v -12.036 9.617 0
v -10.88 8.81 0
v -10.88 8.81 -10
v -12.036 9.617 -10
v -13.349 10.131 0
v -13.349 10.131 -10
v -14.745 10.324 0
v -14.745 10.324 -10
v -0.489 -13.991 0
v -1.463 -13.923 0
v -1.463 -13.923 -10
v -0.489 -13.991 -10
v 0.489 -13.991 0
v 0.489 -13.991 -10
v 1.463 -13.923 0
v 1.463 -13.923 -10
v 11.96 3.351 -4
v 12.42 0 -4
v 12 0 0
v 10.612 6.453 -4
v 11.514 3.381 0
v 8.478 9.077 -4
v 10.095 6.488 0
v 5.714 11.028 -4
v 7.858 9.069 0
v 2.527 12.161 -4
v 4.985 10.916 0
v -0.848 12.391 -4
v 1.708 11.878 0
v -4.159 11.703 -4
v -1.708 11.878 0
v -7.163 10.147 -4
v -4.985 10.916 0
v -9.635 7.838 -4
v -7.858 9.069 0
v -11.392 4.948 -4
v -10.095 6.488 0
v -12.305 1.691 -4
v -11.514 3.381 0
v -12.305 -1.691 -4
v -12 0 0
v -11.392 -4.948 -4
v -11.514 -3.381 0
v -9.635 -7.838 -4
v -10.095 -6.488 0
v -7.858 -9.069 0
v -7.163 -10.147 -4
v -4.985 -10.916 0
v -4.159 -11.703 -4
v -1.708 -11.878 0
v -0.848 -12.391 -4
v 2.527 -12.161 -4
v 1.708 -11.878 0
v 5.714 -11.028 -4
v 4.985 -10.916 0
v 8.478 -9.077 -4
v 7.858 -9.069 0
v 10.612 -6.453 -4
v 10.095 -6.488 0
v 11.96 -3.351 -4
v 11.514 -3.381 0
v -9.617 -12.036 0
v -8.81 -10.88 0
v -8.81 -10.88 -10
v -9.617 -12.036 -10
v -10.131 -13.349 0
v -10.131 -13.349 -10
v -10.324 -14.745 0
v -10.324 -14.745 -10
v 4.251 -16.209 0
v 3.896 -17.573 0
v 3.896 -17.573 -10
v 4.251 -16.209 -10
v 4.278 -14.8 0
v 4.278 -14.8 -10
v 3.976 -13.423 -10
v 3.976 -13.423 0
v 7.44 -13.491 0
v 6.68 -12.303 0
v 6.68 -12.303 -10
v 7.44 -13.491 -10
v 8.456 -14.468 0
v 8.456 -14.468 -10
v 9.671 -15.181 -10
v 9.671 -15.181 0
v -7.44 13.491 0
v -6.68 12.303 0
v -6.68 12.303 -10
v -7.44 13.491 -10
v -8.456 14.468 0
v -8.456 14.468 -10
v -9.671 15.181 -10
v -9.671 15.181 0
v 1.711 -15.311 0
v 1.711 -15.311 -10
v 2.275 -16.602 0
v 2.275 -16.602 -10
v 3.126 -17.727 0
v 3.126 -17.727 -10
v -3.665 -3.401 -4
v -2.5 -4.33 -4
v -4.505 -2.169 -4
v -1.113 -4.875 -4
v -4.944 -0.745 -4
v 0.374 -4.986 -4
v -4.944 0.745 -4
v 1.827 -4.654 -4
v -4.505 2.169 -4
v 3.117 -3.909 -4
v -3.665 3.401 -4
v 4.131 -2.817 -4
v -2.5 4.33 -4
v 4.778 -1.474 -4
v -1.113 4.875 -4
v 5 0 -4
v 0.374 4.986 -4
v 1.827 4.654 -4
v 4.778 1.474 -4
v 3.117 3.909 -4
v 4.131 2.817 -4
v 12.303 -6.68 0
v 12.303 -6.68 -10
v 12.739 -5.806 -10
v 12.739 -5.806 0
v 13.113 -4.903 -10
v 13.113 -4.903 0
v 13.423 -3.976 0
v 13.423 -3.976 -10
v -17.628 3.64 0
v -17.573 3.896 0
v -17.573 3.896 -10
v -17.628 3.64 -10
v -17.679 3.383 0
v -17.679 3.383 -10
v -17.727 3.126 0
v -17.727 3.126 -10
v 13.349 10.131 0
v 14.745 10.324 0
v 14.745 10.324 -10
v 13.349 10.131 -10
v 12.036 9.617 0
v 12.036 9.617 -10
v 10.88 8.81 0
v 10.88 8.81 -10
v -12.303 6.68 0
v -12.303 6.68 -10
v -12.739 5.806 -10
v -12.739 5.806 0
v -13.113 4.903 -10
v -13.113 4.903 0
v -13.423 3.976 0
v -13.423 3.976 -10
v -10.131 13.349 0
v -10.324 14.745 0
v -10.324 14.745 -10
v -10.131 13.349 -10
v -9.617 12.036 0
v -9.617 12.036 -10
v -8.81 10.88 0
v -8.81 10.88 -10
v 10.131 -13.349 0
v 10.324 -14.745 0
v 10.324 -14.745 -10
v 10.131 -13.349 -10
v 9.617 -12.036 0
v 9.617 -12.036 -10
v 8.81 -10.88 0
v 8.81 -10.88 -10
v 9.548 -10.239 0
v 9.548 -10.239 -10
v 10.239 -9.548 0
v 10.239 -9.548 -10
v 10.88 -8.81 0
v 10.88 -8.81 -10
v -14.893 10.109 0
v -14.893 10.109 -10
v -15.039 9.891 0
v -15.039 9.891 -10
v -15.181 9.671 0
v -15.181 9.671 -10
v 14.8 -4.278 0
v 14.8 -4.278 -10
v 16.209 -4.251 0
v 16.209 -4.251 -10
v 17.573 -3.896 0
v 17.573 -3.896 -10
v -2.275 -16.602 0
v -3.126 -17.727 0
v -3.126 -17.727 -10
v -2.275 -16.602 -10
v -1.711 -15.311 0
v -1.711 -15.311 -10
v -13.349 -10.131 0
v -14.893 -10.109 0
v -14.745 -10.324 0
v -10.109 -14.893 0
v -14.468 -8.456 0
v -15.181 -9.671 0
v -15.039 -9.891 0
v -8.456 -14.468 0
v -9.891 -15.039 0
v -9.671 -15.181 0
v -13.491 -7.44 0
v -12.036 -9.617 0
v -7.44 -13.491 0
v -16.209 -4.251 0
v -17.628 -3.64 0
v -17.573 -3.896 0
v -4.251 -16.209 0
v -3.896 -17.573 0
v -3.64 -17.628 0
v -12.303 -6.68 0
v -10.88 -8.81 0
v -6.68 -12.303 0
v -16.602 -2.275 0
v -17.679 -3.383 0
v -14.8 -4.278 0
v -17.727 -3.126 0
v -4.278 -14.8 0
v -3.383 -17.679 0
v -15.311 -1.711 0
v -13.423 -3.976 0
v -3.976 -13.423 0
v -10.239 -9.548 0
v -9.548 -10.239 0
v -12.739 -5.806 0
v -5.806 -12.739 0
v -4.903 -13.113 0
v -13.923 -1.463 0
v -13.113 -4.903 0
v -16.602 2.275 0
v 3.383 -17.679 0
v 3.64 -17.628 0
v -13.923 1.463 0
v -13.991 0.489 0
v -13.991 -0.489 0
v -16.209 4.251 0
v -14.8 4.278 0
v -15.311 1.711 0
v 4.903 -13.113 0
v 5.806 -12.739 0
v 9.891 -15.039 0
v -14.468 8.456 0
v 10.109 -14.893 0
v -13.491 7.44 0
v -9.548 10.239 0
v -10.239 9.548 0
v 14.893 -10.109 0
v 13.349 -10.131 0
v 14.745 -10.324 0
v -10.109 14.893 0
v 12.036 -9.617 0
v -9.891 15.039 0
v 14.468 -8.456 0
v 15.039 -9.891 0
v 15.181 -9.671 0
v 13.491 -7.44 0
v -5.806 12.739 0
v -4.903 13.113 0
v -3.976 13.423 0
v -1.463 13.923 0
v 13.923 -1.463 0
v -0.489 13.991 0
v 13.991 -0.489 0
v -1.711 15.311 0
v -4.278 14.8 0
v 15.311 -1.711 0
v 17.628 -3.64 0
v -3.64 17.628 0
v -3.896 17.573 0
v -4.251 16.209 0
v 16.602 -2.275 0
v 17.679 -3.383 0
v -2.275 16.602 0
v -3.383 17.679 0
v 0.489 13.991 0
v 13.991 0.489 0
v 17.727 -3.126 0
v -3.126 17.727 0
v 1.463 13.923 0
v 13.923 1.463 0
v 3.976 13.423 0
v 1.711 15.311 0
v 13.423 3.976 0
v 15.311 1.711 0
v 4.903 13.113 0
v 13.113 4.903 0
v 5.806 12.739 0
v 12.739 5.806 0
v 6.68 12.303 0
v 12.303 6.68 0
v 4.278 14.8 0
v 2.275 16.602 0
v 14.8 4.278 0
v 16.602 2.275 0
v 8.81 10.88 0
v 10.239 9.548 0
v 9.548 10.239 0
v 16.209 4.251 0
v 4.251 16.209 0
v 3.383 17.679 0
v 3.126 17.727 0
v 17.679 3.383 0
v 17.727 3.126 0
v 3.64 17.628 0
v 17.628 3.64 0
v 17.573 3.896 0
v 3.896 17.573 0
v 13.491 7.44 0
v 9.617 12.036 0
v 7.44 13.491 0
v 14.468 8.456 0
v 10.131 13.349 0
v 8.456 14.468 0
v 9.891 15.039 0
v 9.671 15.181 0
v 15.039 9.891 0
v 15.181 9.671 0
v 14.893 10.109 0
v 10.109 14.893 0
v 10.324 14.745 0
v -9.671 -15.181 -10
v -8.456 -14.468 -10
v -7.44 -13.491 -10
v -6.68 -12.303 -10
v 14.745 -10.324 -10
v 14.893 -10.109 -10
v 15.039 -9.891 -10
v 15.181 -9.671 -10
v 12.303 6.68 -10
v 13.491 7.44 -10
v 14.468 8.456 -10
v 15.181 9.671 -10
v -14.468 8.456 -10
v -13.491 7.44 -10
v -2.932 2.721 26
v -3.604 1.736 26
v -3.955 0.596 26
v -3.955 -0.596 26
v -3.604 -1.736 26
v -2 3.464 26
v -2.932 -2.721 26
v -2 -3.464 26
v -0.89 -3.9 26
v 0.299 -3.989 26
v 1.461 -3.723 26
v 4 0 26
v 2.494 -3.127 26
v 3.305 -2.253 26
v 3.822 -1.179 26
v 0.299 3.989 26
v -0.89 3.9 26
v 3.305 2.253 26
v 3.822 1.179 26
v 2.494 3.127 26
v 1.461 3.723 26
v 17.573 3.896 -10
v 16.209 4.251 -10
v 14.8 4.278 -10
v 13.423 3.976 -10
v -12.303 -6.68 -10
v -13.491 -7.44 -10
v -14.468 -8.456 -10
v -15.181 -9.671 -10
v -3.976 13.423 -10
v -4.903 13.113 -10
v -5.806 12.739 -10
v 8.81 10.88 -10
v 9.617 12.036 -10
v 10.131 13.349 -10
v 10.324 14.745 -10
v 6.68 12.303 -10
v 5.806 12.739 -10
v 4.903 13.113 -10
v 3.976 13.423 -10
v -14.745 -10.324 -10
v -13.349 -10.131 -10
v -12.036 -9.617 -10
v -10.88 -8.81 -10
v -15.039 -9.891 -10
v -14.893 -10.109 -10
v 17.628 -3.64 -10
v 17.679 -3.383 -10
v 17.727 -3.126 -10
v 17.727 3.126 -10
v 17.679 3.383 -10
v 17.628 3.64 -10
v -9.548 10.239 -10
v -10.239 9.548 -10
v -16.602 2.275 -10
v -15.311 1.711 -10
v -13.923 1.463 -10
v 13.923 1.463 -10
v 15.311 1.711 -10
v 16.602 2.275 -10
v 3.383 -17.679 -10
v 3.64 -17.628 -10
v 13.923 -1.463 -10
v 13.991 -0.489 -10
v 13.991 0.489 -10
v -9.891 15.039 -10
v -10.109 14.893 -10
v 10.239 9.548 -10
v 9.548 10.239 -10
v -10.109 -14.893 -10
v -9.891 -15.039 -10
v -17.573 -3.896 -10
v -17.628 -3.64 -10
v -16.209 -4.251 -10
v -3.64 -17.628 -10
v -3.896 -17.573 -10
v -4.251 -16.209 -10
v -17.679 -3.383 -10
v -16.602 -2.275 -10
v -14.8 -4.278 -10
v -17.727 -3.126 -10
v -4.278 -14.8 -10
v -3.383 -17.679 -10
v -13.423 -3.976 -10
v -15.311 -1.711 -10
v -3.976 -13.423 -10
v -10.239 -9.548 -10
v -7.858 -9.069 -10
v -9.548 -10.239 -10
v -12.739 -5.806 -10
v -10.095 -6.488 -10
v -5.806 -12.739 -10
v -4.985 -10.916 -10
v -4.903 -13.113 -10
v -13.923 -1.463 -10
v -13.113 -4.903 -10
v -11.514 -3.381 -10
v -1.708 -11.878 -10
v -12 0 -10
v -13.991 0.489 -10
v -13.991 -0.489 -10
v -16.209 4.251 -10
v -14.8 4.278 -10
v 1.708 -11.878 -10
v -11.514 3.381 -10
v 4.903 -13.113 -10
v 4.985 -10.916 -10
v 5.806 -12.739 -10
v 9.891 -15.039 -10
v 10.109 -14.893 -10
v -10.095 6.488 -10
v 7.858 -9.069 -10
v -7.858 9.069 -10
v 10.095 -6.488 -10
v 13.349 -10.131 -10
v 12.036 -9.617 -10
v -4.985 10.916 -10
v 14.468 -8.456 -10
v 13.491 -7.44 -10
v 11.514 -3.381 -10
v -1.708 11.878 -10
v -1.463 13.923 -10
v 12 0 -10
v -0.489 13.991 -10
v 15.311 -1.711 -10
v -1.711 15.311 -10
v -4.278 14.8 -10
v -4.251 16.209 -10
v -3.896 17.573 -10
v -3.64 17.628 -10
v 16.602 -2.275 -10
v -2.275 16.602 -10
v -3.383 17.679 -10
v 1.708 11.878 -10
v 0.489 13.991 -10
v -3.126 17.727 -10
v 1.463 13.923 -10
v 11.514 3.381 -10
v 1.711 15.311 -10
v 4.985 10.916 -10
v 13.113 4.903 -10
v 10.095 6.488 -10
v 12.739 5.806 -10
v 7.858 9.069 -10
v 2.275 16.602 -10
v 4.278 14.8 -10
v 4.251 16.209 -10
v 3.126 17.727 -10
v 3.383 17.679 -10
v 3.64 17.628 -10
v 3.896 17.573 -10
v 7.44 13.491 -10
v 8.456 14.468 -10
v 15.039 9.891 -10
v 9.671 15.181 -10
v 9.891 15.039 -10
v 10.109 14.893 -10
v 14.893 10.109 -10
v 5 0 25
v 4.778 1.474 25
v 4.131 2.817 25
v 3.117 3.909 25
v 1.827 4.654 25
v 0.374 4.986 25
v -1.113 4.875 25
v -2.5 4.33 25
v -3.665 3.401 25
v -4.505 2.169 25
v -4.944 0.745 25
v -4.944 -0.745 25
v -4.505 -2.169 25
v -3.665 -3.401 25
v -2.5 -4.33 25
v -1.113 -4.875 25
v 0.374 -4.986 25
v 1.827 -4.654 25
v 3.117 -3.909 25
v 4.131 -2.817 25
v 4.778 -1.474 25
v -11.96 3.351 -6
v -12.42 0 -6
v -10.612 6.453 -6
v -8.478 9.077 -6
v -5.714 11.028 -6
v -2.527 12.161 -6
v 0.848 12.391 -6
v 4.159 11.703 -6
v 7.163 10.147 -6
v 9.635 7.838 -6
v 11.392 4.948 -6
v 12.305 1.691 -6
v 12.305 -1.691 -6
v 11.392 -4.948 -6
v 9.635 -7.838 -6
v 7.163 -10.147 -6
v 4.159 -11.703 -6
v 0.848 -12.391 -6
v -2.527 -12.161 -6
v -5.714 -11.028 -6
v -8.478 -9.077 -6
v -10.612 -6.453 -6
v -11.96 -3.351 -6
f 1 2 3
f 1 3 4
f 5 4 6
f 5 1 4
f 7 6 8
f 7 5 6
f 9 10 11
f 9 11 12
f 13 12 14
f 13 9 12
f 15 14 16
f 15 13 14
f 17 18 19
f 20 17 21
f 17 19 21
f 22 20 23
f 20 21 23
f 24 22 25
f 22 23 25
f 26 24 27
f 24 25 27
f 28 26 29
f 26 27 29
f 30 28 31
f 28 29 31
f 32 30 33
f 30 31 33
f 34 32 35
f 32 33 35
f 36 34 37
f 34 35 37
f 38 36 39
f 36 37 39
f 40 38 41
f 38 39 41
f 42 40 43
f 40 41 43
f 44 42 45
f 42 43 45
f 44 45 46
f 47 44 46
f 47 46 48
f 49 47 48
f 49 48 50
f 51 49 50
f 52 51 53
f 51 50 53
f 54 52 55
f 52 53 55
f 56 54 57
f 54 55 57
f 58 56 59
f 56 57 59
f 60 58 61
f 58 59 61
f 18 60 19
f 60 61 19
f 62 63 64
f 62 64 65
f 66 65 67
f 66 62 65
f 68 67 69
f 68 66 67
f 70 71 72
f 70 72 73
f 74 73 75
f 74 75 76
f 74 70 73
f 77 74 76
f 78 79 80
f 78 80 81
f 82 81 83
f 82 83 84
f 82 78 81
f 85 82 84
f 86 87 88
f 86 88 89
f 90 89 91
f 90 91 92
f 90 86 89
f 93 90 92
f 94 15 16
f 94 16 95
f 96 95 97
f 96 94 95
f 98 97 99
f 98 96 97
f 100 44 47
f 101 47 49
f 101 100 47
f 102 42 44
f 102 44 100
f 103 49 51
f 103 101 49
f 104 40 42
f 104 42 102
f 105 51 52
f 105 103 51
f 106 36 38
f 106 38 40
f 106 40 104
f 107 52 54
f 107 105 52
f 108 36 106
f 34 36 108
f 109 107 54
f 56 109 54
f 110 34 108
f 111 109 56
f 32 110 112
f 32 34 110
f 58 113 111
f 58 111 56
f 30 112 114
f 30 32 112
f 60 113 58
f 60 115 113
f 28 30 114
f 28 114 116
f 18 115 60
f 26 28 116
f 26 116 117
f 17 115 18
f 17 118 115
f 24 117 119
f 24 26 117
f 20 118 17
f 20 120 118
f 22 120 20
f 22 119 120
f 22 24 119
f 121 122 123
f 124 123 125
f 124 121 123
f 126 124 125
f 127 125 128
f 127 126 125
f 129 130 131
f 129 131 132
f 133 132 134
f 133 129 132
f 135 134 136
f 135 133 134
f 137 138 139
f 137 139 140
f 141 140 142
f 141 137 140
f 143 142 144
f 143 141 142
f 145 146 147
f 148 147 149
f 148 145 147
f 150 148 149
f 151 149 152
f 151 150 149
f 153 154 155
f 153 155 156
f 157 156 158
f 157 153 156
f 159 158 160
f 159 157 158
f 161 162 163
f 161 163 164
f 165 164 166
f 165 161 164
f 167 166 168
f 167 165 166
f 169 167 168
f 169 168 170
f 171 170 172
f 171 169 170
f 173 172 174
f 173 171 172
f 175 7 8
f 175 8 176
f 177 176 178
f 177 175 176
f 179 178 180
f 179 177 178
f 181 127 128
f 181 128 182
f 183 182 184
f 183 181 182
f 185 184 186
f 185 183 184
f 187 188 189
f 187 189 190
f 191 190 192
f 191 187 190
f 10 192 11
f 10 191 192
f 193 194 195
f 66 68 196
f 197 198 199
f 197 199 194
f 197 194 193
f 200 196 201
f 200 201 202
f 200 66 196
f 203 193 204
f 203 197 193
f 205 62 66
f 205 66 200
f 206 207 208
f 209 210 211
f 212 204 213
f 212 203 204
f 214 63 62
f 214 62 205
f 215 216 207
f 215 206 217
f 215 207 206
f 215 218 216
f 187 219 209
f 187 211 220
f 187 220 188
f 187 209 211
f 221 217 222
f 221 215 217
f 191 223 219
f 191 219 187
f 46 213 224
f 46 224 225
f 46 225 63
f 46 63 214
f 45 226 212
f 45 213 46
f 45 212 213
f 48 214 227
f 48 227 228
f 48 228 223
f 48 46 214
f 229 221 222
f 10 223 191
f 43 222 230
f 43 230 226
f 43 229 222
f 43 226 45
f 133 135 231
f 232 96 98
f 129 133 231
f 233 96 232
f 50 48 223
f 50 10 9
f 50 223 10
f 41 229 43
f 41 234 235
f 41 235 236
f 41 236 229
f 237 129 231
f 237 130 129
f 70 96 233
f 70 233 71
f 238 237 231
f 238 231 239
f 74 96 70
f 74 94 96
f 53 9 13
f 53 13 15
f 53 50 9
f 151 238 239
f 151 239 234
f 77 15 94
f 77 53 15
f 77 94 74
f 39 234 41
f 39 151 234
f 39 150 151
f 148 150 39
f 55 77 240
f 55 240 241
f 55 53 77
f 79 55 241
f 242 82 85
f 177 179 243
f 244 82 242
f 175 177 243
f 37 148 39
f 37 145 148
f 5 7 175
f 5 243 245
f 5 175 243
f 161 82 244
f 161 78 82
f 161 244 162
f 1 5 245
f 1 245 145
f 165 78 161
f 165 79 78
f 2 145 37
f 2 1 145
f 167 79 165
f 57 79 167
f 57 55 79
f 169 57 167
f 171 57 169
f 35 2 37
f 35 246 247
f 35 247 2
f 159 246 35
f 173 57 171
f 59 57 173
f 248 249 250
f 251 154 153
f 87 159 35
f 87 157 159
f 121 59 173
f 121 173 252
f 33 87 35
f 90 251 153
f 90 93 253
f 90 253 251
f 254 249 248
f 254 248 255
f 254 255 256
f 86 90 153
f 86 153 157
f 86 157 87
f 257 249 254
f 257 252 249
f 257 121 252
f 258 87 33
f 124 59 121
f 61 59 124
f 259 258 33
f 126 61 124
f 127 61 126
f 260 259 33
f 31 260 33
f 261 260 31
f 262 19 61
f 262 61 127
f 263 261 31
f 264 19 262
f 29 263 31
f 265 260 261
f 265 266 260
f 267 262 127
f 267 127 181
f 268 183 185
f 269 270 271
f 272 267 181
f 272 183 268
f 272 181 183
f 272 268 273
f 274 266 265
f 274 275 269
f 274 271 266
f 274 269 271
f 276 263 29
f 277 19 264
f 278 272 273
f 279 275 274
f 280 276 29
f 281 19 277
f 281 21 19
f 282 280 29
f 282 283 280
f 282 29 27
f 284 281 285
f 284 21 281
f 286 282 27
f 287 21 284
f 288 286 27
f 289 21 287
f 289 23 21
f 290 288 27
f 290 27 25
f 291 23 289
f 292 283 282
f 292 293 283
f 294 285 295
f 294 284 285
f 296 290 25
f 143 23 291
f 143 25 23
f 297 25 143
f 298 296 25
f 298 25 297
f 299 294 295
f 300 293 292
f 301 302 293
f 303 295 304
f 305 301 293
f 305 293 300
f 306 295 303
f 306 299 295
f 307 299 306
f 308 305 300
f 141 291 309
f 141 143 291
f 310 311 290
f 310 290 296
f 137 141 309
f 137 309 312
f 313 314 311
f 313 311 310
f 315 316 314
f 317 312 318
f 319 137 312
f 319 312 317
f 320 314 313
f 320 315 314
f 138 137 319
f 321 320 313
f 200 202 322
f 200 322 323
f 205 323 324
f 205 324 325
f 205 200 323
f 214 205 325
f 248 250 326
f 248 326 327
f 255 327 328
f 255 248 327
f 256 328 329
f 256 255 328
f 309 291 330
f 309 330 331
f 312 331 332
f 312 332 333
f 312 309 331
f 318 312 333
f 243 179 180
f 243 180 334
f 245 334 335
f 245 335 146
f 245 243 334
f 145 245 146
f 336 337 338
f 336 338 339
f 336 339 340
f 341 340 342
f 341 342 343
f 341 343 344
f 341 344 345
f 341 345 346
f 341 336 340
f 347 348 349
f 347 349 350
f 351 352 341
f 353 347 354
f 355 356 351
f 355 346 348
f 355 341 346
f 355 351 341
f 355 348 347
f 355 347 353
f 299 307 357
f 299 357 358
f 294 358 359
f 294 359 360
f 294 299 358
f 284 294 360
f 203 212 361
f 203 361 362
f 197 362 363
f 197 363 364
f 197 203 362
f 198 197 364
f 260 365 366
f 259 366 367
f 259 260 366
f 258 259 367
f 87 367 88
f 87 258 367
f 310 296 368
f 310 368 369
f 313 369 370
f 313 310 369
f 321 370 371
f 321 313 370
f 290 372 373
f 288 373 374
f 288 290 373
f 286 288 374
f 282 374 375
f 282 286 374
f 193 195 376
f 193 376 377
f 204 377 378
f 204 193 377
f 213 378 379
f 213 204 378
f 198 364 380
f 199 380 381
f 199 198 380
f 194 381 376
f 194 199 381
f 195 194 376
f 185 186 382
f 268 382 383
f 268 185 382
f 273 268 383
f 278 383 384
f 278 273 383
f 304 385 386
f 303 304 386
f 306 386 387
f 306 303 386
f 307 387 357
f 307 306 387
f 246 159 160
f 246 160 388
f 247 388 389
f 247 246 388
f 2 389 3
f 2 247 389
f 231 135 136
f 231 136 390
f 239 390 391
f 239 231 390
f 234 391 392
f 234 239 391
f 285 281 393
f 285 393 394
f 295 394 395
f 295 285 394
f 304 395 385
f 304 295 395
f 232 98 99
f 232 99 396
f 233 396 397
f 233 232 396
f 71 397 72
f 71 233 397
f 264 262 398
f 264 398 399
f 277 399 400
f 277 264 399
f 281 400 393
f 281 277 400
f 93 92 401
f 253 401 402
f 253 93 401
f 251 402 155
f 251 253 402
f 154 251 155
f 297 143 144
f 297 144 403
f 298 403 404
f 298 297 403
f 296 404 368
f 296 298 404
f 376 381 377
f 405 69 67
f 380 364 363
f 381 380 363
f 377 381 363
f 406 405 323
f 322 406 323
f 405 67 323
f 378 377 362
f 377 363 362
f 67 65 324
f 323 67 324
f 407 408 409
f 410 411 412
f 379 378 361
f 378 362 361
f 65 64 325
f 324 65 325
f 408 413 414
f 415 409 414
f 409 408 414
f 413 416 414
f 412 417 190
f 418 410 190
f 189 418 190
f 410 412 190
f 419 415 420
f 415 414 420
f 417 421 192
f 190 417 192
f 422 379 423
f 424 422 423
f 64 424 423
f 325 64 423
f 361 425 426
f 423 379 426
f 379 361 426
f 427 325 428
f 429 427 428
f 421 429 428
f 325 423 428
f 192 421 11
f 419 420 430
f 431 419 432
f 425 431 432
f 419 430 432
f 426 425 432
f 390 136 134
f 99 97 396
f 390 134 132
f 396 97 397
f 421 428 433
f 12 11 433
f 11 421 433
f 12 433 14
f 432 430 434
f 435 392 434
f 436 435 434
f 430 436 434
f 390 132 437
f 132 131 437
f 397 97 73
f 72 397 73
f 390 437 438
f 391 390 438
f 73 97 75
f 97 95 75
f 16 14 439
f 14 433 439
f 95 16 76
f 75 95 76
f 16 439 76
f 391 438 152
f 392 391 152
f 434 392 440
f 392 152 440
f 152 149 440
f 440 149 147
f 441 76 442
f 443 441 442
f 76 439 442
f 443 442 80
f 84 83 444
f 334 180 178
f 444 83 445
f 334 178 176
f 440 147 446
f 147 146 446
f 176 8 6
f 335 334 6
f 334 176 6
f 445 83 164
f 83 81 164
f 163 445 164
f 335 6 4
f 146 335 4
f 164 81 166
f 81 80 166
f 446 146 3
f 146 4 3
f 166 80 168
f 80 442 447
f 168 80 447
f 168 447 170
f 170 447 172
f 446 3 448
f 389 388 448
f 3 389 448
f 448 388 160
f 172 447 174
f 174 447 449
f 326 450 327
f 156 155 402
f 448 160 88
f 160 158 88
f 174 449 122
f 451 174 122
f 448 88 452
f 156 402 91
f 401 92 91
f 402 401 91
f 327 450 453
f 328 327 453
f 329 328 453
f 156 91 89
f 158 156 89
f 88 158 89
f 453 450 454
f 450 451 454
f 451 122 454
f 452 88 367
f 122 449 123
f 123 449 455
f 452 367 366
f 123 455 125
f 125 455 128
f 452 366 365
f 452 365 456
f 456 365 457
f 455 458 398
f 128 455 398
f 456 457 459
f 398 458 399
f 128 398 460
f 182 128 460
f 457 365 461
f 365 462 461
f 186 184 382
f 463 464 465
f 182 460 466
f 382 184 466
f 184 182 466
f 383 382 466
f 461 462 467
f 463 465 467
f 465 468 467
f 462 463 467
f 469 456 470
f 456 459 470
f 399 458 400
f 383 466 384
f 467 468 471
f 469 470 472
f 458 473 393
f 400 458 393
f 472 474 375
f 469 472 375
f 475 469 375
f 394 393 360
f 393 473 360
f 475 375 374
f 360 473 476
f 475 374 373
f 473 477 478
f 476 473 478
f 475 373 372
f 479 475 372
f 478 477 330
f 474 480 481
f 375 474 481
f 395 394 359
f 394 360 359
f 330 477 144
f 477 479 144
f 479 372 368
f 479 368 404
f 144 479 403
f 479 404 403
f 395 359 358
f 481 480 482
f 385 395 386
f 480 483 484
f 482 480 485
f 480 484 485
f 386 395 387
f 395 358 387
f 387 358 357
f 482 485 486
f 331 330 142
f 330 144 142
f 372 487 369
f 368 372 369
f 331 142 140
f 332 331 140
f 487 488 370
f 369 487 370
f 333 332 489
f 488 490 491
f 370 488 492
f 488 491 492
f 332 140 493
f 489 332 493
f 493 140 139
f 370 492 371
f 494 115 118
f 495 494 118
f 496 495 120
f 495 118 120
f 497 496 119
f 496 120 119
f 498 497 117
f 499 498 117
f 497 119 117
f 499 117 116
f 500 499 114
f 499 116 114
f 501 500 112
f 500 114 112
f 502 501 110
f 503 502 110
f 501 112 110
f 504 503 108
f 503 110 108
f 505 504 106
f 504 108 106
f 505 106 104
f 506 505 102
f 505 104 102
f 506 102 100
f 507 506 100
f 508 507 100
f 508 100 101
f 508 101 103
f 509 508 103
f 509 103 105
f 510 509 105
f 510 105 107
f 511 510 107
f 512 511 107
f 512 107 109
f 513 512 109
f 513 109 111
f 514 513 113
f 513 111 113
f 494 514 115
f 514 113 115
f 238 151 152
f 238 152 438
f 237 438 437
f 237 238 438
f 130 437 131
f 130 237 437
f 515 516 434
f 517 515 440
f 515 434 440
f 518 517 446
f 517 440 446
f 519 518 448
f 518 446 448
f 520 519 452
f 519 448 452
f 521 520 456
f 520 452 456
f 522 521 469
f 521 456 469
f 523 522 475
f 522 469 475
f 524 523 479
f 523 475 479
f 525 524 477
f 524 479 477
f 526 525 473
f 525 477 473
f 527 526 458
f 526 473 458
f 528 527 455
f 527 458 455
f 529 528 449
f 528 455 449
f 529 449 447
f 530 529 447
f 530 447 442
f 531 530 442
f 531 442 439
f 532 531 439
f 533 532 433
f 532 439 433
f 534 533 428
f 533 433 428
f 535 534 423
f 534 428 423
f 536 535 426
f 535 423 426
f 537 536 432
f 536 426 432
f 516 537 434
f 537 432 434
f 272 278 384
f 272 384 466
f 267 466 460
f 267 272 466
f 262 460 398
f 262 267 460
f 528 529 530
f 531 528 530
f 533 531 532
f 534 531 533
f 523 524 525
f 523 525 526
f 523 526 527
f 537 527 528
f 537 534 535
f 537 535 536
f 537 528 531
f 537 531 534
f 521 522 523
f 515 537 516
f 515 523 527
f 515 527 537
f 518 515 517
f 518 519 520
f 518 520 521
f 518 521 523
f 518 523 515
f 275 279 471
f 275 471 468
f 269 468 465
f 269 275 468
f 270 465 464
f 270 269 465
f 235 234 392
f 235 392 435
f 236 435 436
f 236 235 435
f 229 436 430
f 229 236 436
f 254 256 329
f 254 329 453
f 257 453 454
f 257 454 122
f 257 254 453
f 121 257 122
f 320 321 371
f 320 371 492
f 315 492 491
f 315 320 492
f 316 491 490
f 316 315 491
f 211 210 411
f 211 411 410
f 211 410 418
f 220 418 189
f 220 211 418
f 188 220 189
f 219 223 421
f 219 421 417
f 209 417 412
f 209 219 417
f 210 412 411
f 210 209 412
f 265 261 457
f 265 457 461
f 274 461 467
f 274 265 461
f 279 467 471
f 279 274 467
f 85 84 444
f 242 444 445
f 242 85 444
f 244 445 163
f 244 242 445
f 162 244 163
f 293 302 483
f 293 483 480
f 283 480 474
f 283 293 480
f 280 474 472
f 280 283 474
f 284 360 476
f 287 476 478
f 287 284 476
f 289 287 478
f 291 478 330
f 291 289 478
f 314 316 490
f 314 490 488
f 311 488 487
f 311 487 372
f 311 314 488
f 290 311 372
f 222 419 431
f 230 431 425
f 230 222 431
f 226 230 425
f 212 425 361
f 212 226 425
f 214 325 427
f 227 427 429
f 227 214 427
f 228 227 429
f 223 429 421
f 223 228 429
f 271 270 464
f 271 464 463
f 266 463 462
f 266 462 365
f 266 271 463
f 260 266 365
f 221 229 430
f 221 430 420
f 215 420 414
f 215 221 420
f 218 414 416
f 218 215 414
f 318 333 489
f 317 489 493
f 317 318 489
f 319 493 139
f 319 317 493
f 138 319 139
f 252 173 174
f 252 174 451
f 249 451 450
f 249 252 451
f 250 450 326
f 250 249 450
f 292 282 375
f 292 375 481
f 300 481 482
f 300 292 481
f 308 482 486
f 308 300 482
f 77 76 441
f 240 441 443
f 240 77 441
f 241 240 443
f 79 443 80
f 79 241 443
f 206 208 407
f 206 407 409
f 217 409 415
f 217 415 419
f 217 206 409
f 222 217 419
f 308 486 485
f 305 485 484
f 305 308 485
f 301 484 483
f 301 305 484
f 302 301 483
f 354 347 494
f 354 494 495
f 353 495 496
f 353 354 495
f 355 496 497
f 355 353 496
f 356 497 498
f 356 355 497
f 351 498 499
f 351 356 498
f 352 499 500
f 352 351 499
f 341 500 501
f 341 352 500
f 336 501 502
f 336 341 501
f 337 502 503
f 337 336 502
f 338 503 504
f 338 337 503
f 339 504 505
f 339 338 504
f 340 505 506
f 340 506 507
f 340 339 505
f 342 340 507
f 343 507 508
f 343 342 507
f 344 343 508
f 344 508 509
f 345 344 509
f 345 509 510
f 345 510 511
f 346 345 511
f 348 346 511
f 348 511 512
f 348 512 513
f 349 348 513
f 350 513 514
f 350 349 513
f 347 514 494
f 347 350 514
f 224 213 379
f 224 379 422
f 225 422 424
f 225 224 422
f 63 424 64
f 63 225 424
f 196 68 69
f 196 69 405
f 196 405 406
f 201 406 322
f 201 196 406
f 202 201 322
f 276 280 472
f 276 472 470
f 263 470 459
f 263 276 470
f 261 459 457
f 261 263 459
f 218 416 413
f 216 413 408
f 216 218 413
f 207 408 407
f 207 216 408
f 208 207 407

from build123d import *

# Parameters (mm, degrees)
SKETCH_1_R          = 18
EXTRUDE_1_DEPTH     = 10
CUT_EXTRUDE_2_DEPTH = 28.349588662
SKETCH_4_R          = 12
CUT_EXTRUDE_3_DEPTH = 4
CUT_EXTRUDE_3_DRAFT = 6
SKETCH_5_R          = 5
EXTRUDE_2_DEPTH     = 30
CHAMFER_1_SIZE      = 1
SKETCH_6_R          = 12
CUT_EXTRUDE_4_DEPTH = 4
CUT_EXTRUDE_4_DRAFT = 6


with BuildPart() as part:
    # Эскиз1 → Бобышка-Вытянуть1 (new body)
    with BuildSketch(Plane.XY):
        Circle(SKETCH_1_R)
    extrude(amount=-EXTRUDE_1_DEPTH)

    # Эскиз3 → Вырез-Вытянуть2 (cut, through all)
    with BuildSketch(Plane.XY):
        with BuildLine():
            ThreePointArc((1.463398486, 13.923306535), (0, 14), (-1.463398486, 13.923306535))
            ThreePointArc((-1.463398486, 13.923306535), (-1.955189123, 15.973239081), (-3.125667198, 17.726539554))
            ThreePointArc((-3.125667198, 17.726539554), (0, 18), (3.125667198, 17.726539554))
            ThreePointArc((3.125667198, 17.726539554), (1.955189123, 15.973239081), (1.463398486, 13.923306535))
        make_face()
        with BuildLine():
            ThreePointArc((6.680222644, 12.303439577), (5.357568053, 12.934313455), (3.976214826, 13.423476288))
            ThreePointArc((3.976214826, 13.423476288), (4.306334745, 15.505567139), (3.895913051, 17.573328128))
            ThreePointArc((3.895913051, 17.573328128), (6.888301783, 16.629831585), (9.67139295, 15.181046025))
            ThreePointArc((9.67139295, 15.181046025), (7.91905317, 14.009130171), (6.680222644, 12.303439577))
        make_face()
        with BuildLine():
            ThreePointArc((10.88004346, 8.810485475), (9.899494937, 9.899494937), (8.810485475, 10.88004346))
            ThreePointArc((8.810485475, 10.88004346), (9.912258185, 12.677313159), (10.324375854, 14.744736797))
            ThreePointArc((10.324375854, 14.744736797), (12.727922061, 12.727922061), (14.744736797, 10.324375854))
            ThreePointArc((14.744736797, 10.324375854), (12.677313159, 9.912258185), (10.88004346, 8.810485475))
        make_face()
        with BuildLine():
            ThreePointArc((13.423476288, 3.976214826), (12.934313455, 5.357568053), (12.303439577, 6.680222644))
            ThreePointArc((12.303439577, 6.680222644), (14.009130171, 7.91905317), (15.181046025, 9.67139295))
            ThreePointArc((15.181046025, 9.67139295), (16.629831585, 6.888301783), (17.573328128, 3.895913051))
            ThreePointArc((17.573328128, 3.895913051), (15.505567139, 4.306334745), (13.423476288, 3.976214826))
        make_face()
        with BuildLine():
            ThreePointArc((13.923306535, -1.463398486), (14, 0), (13.923306535, 1.463398486))
            ThreePointArc((13.923306535, 1.463398486), (15.973239081, 1.955189123), (17.726539554, 3.125667198))
            ThreePointArc((17.726539554, 3.125667198), (18, 0), (17.726539554, -3.125667198))
            ThreePointArc((17.726539554, -3.125667198), (15.973239081, -1.955189123), (13.923306535, -1.463398486))
        make_face()
        with BuildLine():
            ThreePointArc((12.303439577, -6.680222644), (12.934313455, -5.357568053), (13.423476288, -3.976214826))
            ThreePointArc((13.423476288, -3.976214826), (15.505567139, -4.306334745), (17.573328128, -3.895913051))
            ThreePointArc((17.573328128, -3.895913051), (16.629831585, -6.888301783), (15.181046025, -9.67139295))
            ThreePointArc((15.181046025, -9.67139295), (14.009130171, -7.91905317), (12.303439577, -6.680222644))
        make_face()
        with BuildLine():
            ThreePointArc((8.810485475, -10.88004346), (9.899494937, -9.899494937), (10.88004346, -8.810485475))
            ThreePointArc((10.88004346, -8.810485475), (12.677313159, -9.912258185), (14.744736797, -10.324375854))
            ThreePointArc((14.744736797, -10.324375854), (12.727922061, -12.727922061), (10.324375854, -14.744736797))
            ThreePointArc((10.324375854, -14.744736797), (9.912258185, -12.677313159), (8.810485475, -10.88004346))
        make_face()
        with BuildLine():
            ThreePointArc((3.976214826, -13.423476288), (5.357568053, -12.934313455), (6.680222644, -12.303439577))
            ThreePointArc((6.680222644, -12.303439577), (7.91905317, -14.009130171), (9.67139295, -15.181046025))
            ThreePointArc((9.67139295, -15.181046025), (6.888301783, -16.629831585), (3.895913051, -17.573328128))
            ThreePointArc((3.895913051, -17.573328128), (4.306334745, -15.505567139), (3.976214826, -13.423476288))
        make_face()
        with BuildLine():
            ThreePointArc((-1.463398486, -13.923306535), (0, -14), (1.463398486, -13.923306535))
            ThreePointArc((1.463398486, -13.923306535), (1.955189123, -15.973239081), (3.125667198, -17.726539554))
            ThreePointArc((3.125667198, -17.726539554), (0, -18), (-3.125667198, -17.726539554))
            ThreePointArc((-3.125667198, -17.726539554), (-1.955189123, -15.973239081), (-1.463398486, -13.923306535))
        make_face()
        with BuildLine():
            ThreePointArc((-6.680222644, -12.303439577), (-5.357568053, -12.934313455), (-3.976214826, -13.423476288))
            ThreePointArc((-3.976214826, -13.423476288), (-4.306334745, -15.505567139), (-3.895913051, -17.573328128))
            ThreePointArc((-3.895913051, -17.573328128), (-6.888301783, -16.629831585), (-9.67139295, -15.181046025))
            ThreePointArc((-9.67139295, -15.181046025), (-7.91905317, -14.009130171), (-6.680222644, -12.303439577))
        make_face()
        with BuildLine():
            ThreePointArc((-10.88004346, -8.810485475), (-9.899494937, -9.899494937), (-8.810485475, -10.88004346))
            ThreePointArc((-8.810485475, -10.88004346), (-9.912258185, -12.677313159), (-10.324375854, -14.744736797))
            ThreePointArc((-10.324375854, -14.744736797), (-12.727922061, -12.727922061), (-14.744736797, -10.324375854))
            ThreePointArc((-14.744736797, -10.324375854), (-12.677313159, -9.912258185), (-10.88004346, -8.810485475))
        make_face()
        with BuildLine():
            ThreePointArc((-13.423476288, -3.976214826), (-12.934313455, -5.357568053), (-12.303439577, -6.680222644))
            ThreePointArc((-12.303439577, -6.680222644), (-14.009130171, -7.91905317), (-15.181046025, -9.67139295))
            ThreePointArc((-15.181046025, -9.67139295), (-16.629831585, -6.888301783), (-17.573328128, -3.895913051))
            ThreePointArc((-17.573328128, -3.895913051), (-15.505567139, -4.306334745), (-13.423476288, -3.976214826))
        make_face()
        with BuildLine():
            ThreePointArc((-13.923306535, 1.463398486), (-14, 0), (-13.923306535, -1.463398486))
            ThreePointArc((-13.923306535, -1.463398486), (-15.973239081, -1.955189123), (-17.726539554, -3.125667198))
            ThreePointArc((-17.726539554, -3.125667198), (-18, 0), (-17.726539554, 3.125667198))
            ThreePointArc((-17.726539554, 3.125667198), (-15.973239081, 1.955189123), (-13.923306535, 1.463398486))
        make_face()
        with BuildLine():
            ThreePointArc((-12.303439577, 6.680222644), (-12.934313455, 5.357568053), (-13.423476288, 3.976214826))
            ThreePointArc((-13.423476288, 3.976214826), (-15.505567139, 4.306334745), (-17.573328128, 3.895913051))
            ThreePointArc((-17.573328128, 3.895913051), (-16.629831585, 6.888301783), (-15.181046025, 9.67139295))
            ThreePointArc((-15.181046025, 9.67139295), (-14.009130171, 7.91905317), (-12.303439577, 6.680222644))
        make_face()
        with BuildLine():
            ThreePointArc((-8.810485475, 10.88004346), (-9.899494937, 9.899494937), (-10.88004346, 8.810485475))
            ThreePointArc((-10.88004346, 8.810485475), (-12.677313159, 9.912258185), (-14.744736797, 10.324375854))
            ThreePointArc((-14.744736797, 10.324375854), (-12.727922061, 12.727922061), (-10.324375854, 14.744736797))
            ThreePointArc((-10.324375854, 14.744736797), (-9.912258185, 12.677313159), (-8.810485475, 10.88004346))
        make_face()
        with BuildLine():
            ThreePointArc((-3.976214826, 13.423476288), (-5.357568053, 12.934313455), (-6.680222644, 12.303439577))
            ThreePointArc((-6.680222644, 12.303439577), (-7.91905317, 14.009130171), (-9.67139295, 15.181046025))
            ThreePointArc((-9.67139295, 15.181046025), (-6.888301783, 16.629831585), (-3.895913051, 17.573328128))
            ThreePointArc((-3.895913051, 17.573328128), (-4.306334745, 15.505567139), (-3.976214826, 13.423476288))
        make_face()
    extrude(amount=-CUT_EXTRUDE_2_DEPTH, mode=Mode.SUBTRACT)


with BuildPart() as cut_extrude_3_tool:
    # Эскиз4 → Вырез-Вытянуть3 (with draft: the straight prism first)
    with BuildSketch(Plane.XY):
        Circle(SKETCH_4_R)
    extrude(amount=-CUT_EXTRUDE_3_DEPTH)
    # Вырез-Вытянуть3: the draft: its side faces are tilted about the plane it starts from
    cut_extrude_3_sides = [cut_extrude_3_tool.faces().sort_by_distance(p)[0] for p in [
        (-12, 0, -2),
    ]]
    draft(cut_extrude_3_sides, Plane.XY, CUT_EXTRUDE_3_DRAFT)


with BuildPart() as part_1:
    add(part.part)

    # Вырез-Вытянуть3: cut by cut_extrude_3_tool
    add(cut_extrude_3_tool.part, mode=Mode.SUBTRACT)

    # Эскиз5 → Бобышка-Вытянуть2 (add)
    with BuildSketch(Plane.XY.offset(-4)):
        Circle(SKETCH_5_R)
    extrude(amount=EXTRUDE_2_DEPTH)

    # Фаска1
    chamfer_1_edges = [part_1.edges().sort_by_distance(p)[0] for p in [
        (-5, 0, 26),
    ]]
    chamfer(chamfer_1_edges, length=CHAMFER_1_SIZE)


with BuildPart() as cut_extrude_4_tool:
    # Эскиз6 → Вырез-Вытянуть4 (with draft: the straight prism first)
    with BuildSketch(Plane(origin=(0, 0, -10), x_dir=(-1, 0, 0), z_dir=(0, 0, -1))):
        Circle(SKETCH_6_R)
    extrude(amount=-CUT_EXTRUDE_4_DEPTH)
    # Вырез-Вытянуть4: the draft: its side faces are tilted about the plane it starts from
    cut_extrude_4_sides = [cut_extrude_4_tool.faces().sort_by_distance(p)[0] for p in [
        (12, 0, -8),
    ]]
    draft(cut_extrude_4_sides, Plane(origin=(0, 0, -10), x_dir=(-1, 0, 0), z_dir=(0, 0, -1)), CUT_EXTRUDE_4_DRAFT)


with BuildPart() as part_2:
    add(part_1.part)

    # Вырез-Вытянуть4: cut by cut_extrude_4_tool
    add(cut_extrude_4_tool.part, mode=Mode.SUBTRACT)


solid = part_2.part
